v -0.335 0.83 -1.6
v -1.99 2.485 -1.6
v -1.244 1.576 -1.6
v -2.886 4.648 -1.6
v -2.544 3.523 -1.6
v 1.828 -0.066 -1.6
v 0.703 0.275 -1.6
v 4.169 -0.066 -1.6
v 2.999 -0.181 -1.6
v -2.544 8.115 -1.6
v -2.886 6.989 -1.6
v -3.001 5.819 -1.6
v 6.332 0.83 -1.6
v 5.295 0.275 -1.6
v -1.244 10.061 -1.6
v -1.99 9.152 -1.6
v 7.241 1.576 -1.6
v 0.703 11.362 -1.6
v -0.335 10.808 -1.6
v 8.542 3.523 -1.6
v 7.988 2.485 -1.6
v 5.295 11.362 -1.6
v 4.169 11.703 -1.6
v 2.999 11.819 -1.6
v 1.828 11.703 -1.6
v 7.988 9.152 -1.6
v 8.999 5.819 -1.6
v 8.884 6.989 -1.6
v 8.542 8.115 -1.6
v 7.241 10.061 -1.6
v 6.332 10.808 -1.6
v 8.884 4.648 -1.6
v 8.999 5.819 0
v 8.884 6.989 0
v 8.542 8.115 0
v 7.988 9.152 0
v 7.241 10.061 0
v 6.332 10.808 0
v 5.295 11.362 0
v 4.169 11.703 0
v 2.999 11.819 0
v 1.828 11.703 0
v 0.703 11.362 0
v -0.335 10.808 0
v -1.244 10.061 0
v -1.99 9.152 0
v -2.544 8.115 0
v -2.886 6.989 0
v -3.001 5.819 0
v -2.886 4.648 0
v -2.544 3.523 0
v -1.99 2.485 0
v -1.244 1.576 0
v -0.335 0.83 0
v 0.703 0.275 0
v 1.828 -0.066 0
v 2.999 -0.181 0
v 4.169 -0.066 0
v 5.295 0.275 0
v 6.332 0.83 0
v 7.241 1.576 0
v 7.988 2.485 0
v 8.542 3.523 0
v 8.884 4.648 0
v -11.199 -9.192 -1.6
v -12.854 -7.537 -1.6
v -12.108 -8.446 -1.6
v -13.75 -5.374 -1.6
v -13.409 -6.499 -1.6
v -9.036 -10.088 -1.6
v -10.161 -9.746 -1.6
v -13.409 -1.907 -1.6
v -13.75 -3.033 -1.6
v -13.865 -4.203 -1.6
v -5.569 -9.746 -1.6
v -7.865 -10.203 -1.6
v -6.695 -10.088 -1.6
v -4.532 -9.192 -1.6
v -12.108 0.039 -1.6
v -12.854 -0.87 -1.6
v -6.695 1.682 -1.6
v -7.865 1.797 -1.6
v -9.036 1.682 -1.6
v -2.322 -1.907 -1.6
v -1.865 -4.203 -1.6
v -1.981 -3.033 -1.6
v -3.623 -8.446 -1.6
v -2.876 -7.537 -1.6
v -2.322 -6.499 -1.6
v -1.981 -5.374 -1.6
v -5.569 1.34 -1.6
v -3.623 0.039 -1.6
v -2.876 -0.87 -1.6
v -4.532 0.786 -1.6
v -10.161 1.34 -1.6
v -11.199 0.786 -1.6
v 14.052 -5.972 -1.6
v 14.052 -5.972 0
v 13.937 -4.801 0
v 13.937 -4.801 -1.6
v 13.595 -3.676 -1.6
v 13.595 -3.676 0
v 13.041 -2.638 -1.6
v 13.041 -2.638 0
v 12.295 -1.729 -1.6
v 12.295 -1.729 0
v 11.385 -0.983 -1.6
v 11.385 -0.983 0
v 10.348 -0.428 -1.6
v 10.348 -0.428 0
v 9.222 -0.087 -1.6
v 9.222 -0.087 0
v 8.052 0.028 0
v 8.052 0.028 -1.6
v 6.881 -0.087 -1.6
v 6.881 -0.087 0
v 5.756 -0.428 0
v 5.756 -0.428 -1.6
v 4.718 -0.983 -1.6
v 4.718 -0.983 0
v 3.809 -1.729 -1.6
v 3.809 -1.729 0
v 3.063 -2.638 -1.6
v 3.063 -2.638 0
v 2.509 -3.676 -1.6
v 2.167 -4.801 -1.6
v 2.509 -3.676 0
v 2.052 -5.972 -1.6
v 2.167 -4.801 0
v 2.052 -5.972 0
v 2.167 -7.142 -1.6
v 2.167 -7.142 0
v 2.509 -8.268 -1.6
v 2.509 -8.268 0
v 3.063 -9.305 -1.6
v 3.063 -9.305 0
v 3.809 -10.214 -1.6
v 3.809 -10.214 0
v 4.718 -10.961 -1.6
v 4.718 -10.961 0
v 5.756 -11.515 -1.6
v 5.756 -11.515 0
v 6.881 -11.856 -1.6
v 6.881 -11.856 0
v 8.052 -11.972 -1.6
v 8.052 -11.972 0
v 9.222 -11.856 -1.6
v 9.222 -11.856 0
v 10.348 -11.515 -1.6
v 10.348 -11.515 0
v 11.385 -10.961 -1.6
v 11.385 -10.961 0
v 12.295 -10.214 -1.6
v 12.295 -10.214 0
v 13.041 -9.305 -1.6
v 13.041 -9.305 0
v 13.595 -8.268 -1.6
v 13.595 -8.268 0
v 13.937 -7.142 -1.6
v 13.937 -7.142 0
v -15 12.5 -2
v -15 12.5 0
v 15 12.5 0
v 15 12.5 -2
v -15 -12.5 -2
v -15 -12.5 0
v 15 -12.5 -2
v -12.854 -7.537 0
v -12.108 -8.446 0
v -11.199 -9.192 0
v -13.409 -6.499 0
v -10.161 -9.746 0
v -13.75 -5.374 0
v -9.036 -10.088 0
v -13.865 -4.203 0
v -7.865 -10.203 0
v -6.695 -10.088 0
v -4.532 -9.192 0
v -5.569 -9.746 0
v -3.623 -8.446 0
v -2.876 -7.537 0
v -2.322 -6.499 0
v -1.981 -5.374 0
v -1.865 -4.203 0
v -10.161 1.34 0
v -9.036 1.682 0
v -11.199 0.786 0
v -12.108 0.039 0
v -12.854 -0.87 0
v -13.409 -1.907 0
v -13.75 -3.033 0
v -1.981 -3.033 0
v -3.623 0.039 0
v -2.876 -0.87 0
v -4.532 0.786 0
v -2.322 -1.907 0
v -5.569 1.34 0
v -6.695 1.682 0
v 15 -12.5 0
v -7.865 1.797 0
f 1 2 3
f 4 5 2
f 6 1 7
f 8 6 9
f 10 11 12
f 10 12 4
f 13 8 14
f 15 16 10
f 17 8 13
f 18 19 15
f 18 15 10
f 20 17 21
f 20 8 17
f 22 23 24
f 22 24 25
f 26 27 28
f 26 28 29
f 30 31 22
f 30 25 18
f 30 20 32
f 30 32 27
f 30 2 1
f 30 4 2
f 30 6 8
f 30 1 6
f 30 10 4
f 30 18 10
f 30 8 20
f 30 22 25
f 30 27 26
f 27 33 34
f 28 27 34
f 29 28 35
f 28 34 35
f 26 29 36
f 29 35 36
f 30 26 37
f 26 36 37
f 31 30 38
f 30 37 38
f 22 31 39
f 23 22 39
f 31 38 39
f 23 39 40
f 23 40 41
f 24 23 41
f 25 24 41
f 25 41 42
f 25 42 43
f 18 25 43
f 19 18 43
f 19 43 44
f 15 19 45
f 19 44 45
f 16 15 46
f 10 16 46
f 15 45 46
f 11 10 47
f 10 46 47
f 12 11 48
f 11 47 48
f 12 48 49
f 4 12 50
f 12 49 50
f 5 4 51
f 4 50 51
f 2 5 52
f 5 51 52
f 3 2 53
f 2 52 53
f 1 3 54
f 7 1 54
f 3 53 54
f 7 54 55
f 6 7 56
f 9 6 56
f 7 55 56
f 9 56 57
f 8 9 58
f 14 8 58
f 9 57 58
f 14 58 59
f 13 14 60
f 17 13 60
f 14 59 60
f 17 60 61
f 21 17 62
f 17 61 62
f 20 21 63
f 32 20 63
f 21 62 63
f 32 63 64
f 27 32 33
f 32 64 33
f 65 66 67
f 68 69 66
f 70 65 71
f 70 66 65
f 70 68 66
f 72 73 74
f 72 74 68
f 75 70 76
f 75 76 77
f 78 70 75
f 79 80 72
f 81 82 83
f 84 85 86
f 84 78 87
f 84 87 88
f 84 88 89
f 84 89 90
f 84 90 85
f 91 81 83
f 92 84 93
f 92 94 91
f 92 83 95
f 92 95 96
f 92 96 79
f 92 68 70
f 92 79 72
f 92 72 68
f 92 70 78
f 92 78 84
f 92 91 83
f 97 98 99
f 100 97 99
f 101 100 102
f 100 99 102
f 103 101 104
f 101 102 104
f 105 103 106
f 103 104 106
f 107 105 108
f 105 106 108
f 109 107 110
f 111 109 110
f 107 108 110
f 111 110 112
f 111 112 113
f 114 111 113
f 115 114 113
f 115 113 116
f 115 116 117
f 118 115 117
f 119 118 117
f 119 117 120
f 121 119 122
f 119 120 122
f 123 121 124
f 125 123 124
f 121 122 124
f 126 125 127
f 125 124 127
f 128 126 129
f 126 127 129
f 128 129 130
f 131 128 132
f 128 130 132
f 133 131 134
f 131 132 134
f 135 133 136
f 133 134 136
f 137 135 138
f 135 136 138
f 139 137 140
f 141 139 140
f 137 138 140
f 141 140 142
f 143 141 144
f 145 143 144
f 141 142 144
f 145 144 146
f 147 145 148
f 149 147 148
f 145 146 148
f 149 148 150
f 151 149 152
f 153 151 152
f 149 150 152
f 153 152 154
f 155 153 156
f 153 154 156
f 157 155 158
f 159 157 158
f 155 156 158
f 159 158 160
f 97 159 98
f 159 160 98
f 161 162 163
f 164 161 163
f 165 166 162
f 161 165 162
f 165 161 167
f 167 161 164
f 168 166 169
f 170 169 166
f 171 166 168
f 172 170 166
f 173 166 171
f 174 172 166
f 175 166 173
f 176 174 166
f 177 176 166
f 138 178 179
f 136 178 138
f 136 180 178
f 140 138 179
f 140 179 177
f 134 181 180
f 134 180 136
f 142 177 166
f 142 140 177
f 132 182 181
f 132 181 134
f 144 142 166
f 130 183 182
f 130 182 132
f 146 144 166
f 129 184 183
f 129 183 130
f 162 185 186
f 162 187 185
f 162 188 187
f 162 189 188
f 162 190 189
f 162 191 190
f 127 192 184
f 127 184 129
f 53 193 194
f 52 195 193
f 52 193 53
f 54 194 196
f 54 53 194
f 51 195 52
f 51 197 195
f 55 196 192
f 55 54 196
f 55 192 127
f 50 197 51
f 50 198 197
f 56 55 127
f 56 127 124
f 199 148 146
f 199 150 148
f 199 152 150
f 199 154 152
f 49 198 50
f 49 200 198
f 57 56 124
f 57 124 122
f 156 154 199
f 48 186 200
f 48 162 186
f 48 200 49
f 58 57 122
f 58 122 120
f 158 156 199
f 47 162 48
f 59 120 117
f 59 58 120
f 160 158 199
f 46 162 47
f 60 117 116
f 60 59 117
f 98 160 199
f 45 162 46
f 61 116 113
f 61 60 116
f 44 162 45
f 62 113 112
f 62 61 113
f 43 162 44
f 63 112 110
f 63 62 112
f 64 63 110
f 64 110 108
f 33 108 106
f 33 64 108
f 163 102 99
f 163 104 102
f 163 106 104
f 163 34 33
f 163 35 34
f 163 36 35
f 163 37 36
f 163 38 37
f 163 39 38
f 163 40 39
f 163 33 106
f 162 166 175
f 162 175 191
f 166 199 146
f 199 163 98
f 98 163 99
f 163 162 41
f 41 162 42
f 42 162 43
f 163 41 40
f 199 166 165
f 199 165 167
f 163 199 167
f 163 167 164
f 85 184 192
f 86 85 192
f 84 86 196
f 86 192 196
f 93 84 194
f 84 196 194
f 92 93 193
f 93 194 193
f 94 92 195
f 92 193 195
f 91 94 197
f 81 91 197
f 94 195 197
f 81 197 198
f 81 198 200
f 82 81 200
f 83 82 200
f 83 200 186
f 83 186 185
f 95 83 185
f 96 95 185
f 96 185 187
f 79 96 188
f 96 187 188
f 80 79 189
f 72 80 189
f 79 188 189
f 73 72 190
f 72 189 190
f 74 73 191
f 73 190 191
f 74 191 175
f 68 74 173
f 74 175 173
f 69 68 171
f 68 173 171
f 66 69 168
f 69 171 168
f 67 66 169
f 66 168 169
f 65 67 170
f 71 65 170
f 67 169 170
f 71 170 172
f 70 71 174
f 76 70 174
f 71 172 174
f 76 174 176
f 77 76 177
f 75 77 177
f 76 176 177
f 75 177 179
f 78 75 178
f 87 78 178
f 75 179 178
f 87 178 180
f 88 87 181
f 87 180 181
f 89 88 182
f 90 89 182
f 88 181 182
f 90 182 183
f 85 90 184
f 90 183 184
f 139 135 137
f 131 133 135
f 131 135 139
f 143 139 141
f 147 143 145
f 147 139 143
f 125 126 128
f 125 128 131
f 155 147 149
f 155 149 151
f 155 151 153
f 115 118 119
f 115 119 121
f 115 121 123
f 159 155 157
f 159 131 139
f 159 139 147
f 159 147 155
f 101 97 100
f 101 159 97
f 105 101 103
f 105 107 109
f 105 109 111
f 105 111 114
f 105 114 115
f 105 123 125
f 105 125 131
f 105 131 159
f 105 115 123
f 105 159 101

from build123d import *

# Parameters (mm, degrees)
F0_W     = 30
F0_H     = 25
F1_DEPTH = 2
F2_R     = 6
F3_DEPTH = 1.6


with BuildPart() as f1:
    # F0 (on Top) → F1 (new body)
    with BuildSketch(Plane.XY):
        Rectangle(F0_W, F0_H)
    extrude(amount=-F1_DEPTH)

    # F2 (on Top) → F3 (cut)
    with BuildSketch(Plane.XY):
        with Locations((-7.865239, -4.20318)):
            Circle(F2_R)
        with Locations((2.998843, 5.818724)):
            Circle(F2_R)
        with Locations((8.051903, -5.971751)):
            Circle(F2_R)
    extrude(amount=-F3_DEPTH, mode=Mode.SUBTRACT)


solid = f1.part
